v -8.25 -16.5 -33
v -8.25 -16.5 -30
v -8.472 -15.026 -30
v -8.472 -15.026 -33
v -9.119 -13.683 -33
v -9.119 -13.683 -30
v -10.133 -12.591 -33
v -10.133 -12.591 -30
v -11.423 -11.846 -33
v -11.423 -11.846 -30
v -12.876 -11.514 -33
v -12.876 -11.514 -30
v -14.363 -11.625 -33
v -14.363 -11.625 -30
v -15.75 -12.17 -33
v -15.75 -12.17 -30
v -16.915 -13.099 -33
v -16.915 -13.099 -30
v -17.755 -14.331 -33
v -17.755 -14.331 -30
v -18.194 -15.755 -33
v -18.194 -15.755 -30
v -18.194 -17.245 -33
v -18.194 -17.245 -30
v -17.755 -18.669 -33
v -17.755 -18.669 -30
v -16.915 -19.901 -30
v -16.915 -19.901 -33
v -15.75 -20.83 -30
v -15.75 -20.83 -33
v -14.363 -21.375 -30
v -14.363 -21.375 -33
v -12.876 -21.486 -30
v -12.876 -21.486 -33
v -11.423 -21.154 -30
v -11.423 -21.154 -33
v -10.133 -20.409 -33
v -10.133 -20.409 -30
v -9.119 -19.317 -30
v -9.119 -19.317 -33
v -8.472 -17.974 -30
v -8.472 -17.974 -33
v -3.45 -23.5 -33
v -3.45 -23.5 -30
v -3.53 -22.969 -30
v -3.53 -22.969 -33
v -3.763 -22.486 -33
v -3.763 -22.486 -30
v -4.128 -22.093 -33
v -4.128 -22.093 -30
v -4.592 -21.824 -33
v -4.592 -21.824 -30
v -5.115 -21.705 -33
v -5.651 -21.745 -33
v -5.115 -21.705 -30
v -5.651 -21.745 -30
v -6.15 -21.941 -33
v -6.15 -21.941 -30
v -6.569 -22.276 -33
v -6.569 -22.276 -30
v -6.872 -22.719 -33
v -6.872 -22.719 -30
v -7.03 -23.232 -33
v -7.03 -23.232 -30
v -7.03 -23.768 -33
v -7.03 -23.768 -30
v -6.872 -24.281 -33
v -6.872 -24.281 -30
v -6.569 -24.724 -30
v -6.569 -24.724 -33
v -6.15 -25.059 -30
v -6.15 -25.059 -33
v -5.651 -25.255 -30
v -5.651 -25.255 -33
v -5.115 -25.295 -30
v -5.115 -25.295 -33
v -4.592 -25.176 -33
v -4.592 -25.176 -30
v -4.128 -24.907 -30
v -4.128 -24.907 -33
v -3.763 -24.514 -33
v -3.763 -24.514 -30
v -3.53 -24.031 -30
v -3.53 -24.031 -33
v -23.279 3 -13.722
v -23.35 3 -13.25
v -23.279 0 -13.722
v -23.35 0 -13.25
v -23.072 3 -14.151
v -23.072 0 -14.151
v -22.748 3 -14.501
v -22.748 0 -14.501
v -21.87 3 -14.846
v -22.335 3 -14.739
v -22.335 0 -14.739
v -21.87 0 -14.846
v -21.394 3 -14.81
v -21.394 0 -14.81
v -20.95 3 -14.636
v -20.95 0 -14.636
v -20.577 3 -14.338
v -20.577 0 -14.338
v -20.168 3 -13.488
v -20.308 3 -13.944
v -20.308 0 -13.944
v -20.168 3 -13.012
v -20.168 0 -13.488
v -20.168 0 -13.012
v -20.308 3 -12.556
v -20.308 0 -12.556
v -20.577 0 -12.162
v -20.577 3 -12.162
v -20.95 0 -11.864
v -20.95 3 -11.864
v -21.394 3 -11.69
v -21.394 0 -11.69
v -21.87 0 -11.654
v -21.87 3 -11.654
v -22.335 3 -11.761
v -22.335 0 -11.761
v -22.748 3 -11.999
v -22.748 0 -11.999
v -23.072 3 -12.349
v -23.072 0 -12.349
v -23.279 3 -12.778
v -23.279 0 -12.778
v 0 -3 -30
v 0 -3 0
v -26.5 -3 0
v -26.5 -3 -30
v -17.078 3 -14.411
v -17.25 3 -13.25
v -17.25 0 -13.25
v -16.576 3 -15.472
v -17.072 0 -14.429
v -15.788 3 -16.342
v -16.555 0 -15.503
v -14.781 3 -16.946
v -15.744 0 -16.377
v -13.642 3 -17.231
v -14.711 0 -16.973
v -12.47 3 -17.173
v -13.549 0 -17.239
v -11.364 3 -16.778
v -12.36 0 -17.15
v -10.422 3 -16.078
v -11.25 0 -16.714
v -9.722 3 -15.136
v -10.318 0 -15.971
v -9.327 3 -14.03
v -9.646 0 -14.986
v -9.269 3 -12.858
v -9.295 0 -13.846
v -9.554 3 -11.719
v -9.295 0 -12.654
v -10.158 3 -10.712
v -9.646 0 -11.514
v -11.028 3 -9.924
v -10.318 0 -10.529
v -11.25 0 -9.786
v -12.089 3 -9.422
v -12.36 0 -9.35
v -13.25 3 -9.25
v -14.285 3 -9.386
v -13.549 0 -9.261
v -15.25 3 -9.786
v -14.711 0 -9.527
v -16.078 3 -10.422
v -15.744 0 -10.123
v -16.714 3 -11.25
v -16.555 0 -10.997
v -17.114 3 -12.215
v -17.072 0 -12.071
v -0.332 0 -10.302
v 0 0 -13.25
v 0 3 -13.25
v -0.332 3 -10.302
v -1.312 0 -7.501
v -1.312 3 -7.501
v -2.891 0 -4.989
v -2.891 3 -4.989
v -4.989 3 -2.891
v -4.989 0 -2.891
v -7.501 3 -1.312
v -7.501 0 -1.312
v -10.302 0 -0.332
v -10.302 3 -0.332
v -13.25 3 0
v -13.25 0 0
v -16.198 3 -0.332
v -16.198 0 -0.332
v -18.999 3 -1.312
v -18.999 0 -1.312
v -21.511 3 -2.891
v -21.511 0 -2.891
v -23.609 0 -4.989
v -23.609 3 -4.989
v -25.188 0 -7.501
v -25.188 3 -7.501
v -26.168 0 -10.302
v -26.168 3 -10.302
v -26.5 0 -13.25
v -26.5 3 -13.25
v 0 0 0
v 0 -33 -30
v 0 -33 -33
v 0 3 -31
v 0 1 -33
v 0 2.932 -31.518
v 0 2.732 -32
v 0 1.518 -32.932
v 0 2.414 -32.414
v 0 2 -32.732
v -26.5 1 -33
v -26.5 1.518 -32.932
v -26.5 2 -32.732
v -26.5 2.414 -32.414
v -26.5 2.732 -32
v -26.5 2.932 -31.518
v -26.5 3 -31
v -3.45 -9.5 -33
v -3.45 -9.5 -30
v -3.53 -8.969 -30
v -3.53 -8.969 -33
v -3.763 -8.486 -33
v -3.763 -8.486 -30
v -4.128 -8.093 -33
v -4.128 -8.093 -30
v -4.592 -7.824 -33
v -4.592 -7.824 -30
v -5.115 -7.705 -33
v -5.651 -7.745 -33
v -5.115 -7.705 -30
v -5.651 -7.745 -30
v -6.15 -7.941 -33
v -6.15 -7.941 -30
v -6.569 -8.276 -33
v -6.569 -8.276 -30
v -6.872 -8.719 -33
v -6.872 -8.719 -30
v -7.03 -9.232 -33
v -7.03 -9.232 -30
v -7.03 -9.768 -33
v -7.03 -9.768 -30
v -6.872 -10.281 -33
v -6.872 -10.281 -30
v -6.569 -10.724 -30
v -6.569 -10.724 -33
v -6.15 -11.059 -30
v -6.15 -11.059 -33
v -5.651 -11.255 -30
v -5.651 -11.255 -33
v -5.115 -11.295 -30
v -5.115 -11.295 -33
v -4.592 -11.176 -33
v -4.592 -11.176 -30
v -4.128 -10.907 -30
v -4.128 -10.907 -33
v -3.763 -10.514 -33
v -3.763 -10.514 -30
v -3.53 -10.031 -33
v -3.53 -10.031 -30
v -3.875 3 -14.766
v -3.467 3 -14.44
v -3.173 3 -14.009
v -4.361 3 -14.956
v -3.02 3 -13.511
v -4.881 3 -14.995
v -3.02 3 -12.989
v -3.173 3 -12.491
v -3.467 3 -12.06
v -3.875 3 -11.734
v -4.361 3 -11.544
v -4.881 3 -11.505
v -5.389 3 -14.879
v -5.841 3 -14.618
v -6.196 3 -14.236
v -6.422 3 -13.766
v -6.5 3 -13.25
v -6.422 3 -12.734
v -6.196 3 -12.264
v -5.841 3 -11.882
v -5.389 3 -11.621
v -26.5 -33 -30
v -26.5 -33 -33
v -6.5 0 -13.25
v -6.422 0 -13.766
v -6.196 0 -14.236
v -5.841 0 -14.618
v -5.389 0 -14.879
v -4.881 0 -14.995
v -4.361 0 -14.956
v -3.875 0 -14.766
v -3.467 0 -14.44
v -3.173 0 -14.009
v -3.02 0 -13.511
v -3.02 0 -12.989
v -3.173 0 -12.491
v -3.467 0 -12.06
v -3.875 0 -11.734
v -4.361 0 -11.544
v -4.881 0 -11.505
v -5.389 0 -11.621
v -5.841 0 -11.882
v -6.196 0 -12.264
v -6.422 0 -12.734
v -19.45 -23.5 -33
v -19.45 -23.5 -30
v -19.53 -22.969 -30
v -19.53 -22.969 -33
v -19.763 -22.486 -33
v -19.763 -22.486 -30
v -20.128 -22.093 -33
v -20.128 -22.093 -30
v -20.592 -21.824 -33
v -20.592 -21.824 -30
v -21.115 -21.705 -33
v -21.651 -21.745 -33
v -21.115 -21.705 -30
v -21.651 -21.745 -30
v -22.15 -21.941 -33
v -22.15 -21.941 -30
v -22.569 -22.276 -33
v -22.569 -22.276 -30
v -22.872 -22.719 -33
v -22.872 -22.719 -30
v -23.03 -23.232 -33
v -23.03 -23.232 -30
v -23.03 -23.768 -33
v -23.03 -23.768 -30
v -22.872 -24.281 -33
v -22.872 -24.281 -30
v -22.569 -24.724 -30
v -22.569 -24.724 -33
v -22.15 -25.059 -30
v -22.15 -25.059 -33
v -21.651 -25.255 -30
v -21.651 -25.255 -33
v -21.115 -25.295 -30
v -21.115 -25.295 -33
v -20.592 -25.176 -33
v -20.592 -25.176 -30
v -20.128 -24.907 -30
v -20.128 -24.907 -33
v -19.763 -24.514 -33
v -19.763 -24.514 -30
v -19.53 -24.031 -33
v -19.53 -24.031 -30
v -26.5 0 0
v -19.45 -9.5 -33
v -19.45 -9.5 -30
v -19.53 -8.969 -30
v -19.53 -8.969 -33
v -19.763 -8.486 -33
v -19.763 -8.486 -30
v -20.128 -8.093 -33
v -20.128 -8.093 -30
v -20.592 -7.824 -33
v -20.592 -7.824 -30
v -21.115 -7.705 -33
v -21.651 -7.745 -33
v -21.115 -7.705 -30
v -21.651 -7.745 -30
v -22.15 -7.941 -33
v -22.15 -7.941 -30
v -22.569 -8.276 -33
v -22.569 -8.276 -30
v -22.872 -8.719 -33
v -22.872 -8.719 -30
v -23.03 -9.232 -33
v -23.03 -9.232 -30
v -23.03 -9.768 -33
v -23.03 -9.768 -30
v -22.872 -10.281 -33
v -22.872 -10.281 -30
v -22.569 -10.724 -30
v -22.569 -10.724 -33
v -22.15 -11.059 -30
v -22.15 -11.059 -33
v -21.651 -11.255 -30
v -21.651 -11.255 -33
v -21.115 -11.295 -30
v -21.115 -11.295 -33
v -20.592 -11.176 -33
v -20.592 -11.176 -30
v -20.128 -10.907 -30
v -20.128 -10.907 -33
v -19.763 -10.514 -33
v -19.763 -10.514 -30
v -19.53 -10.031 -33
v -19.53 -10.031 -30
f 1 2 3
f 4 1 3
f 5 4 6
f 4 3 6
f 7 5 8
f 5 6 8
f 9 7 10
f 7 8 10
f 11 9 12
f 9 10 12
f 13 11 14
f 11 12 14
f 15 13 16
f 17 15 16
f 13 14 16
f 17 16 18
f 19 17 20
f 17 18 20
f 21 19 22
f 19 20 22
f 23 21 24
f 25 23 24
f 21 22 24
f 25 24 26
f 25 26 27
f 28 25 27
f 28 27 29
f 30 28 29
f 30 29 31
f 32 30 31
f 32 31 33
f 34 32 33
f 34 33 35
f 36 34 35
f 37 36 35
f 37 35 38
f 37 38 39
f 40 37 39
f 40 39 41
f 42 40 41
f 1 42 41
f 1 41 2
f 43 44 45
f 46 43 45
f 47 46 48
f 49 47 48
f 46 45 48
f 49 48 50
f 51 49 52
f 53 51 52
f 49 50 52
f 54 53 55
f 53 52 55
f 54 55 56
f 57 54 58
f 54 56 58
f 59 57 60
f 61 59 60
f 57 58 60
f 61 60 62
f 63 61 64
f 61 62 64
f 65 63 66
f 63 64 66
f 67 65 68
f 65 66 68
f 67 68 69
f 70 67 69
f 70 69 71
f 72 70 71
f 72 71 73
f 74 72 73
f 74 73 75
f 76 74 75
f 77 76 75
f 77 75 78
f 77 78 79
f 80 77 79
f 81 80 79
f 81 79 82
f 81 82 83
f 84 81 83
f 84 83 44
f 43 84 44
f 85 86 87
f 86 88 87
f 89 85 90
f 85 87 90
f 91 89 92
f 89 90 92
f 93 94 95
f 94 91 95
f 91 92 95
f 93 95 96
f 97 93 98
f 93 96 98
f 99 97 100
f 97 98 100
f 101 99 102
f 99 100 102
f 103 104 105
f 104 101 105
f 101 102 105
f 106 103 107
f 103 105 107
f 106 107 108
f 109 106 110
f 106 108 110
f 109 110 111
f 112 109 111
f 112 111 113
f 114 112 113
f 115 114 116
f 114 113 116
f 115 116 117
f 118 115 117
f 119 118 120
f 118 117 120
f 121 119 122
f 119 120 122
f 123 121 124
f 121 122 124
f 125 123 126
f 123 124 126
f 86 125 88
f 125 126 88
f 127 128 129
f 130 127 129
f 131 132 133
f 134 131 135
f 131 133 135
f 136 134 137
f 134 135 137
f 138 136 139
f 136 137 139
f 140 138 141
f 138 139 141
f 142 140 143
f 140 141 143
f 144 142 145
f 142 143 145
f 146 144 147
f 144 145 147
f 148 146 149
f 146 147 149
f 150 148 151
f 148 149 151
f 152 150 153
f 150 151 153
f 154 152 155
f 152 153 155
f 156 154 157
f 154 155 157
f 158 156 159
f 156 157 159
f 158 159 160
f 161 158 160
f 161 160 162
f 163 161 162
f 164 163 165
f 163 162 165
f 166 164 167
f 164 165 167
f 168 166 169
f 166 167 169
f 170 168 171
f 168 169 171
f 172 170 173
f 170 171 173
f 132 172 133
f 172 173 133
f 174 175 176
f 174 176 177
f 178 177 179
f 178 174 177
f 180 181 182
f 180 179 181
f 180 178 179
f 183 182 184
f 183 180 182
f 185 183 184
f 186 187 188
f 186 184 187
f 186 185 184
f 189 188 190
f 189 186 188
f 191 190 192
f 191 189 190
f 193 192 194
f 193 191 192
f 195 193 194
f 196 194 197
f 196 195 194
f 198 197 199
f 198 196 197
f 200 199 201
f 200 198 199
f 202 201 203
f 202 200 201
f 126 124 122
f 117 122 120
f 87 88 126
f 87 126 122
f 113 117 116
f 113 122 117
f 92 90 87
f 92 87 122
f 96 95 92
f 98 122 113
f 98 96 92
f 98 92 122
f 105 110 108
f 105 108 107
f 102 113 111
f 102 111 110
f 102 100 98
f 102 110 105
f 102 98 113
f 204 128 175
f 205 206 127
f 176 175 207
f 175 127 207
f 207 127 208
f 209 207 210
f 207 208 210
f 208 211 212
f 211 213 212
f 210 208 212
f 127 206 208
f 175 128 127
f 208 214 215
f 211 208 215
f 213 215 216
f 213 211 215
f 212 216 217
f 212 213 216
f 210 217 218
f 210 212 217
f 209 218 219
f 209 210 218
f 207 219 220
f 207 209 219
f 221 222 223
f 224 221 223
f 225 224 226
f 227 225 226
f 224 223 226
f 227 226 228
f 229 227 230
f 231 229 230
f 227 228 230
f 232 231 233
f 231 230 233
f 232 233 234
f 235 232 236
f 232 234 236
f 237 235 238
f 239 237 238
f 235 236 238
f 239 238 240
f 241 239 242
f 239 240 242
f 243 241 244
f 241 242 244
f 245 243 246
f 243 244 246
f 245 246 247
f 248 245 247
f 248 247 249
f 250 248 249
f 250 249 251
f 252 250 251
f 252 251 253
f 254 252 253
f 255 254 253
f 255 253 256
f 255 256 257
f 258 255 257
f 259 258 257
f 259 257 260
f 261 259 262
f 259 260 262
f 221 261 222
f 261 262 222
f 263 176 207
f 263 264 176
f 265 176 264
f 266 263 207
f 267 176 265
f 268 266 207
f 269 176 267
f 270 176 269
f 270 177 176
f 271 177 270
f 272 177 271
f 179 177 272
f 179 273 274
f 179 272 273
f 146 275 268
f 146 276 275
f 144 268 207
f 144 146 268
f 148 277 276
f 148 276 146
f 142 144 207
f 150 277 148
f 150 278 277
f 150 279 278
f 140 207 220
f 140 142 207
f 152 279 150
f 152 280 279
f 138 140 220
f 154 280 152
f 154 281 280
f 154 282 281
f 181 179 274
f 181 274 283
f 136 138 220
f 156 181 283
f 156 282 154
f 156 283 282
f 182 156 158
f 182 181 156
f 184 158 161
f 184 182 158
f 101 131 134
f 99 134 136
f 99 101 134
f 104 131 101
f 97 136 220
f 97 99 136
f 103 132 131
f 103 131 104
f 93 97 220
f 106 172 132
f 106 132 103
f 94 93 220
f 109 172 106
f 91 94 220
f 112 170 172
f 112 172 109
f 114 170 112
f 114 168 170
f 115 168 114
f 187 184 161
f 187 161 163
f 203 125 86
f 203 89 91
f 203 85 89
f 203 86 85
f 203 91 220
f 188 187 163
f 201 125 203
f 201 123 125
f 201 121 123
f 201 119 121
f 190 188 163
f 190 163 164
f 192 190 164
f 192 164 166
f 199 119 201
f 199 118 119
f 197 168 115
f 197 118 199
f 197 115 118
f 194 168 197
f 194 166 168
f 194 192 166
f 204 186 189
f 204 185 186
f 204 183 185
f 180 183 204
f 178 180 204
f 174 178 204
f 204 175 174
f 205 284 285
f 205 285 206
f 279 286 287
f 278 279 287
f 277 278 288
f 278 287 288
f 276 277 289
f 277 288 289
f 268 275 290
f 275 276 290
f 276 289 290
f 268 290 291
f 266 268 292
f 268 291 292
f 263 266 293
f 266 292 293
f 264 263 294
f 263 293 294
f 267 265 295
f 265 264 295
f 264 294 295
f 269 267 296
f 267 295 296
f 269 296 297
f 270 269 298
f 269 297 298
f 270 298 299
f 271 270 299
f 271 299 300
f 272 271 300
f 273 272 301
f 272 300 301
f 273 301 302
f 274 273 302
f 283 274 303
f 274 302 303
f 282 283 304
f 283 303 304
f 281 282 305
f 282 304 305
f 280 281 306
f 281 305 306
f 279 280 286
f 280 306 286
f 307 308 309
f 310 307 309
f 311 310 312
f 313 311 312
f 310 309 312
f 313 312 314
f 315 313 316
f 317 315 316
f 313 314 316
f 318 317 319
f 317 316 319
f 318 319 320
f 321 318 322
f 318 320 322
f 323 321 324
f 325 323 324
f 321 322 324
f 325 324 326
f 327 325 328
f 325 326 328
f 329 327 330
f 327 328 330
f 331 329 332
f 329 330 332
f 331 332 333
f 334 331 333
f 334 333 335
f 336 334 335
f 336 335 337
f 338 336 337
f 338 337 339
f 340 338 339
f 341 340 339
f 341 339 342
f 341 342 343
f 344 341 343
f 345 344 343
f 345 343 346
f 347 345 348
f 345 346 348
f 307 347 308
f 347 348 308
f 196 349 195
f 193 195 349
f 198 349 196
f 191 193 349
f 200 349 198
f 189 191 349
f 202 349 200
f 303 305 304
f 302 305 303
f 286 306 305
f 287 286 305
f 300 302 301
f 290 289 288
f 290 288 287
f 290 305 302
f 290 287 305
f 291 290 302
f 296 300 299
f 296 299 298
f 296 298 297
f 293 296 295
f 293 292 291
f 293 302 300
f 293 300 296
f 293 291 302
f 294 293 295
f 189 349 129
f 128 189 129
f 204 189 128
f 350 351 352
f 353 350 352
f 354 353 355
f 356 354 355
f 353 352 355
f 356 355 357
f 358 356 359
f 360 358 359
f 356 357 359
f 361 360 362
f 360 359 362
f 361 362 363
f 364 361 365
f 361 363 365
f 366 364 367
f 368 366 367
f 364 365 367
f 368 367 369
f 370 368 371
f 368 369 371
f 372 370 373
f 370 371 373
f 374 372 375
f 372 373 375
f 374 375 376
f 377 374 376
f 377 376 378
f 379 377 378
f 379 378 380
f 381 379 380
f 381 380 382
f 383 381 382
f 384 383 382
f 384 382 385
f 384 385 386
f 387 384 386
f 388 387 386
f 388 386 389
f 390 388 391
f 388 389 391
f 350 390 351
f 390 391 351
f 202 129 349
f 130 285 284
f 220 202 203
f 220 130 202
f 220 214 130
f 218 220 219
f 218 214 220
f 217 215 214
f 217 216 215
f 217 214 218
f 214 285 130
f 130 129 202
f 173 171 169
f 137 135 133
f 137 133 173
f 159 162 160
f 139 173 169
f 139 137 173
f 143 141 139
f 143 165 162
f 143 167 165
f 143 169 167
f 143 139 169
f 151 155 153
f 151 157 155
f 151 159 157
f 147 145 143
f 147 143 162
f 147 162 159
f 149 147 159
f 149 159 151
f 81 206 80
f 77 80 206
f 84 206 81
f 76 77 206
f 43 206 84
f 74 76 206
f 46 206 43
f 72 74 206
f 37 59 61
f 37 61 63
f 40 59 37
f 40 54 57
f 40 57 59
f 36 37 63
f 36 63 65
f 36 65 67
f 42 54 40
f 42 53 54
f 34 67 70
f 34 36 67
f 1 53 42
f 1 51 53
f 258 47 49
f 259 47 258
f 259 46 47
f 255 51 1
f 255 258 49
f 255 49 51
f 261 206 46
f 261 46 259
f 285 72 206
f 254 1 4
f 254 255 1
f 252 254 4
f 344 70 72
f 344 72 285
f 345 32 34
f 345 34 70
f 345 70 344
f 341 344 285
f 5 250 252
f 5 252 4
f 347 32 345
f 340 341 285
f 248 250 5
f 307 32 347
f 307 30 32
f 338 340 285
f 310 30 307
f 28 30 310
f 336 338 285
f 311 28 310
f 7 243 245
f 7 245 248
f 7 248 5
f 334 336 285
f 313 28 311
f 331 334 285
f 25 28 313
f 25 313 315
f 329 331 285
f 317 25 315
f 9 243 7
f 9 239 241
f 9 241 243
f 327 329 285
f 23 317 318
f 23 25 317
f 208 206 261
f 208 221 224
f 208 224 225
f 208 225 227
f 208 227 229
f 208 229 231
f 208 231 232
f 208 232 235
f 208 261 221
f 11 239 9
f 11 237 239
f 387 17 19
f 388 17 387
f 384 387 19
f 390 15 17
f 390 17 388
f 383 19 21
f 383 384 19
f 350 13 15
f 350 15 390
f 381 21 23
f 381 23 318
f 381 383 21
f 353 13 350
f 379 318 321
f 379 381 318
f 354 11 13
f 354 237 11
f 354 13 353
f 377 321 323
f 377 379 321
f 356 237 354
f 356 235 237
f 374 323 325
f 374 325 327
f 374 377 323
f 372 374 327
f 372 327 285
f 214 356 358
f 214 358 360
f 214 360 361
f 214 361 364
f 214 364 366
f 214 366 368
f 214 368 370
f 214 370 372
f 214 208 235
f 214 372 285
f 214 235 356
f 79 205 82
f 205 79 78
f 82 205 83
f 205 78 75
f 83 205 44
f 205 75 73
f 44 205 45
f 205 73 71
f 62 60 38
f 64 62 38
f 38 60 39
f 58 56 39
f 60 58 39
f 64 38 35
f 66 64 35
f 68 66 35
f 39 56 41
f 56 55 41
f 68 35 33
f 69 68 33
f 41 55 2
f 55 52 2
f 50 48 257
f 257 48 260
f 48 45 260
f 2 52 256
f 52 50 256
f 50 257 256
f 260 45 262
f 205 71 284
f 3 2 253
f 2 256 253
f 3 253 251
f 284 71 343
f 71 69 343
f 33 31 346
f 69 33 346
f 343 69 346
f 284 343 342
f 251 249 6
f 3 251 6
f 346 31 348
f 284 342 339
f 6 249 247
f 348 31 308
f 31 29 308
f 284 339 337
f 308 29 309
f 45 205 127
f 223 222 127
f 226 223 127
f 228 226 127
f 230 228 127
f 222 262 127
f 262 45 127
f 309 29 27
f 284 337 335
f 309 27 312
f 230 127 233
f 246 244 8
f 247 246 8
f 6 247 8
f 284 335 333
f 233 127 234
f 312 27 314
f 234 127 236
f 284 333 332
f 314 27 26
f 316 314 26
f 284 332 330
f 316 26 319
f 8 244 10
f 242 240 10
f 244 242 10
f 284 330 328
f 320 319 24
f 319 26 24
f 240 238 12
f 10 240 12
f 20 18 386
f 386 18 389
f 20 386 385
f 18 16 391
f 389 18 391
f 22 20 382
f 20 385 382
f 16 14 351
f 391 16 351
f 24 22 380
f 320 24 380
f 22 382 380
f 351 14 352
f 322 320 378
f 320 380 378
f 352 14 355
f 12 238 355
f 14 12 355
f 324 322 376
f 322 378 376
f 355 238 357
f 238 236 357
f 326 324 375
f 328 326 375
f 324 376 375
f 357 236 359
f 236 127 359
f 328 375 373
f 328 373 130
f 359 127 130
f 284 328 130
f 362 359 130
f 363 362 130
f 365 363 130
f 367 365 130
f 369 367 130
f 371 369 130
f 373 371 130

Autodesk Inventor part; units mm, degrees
ref_plane "YZ Plane" through (0, 0, 0) normal (1, 0, 0) x (0, 1, 0)
ref_plane "XZ Plane" through (0, 0, 0) normal (0, 1, 0) x (-1, 0, 0)
ref_plane "XY Plane" through (0, 0, 0) normal (0, 0, 1) x (1, 0, 0)
sketch "Sketch1" plane through (0, 0, 0) normal (0, 1, 0) x (-1, 0, 0)
  line L0 (0, 0) -> (26.5, 0)
  line L1 (26.5, 0) -> (26.5, -33)
  line L2 (26.5, -33) -> (0, -33)
  line L3 (0, -33) -> (0, 0)
  line L4 (26.5, -33) -> (26.5, -30)
  line L5 (26.5, -30) -> (0, -30)
  circle A0 centre (13.25, -13.25) radius 4
  arc A1 (22.5449, -12.2666) -> (20.6583, -12.6119) centre (21.75, -13.25) ccw
  circle A2 centre (21.75, -13.25) radius 1.6
  circle A3 centre (4.75, -13.25) radius 1.75
  circle A4 centre (4.75, -13.25) radius 1.6
  circle A5 centre (13.25, -13.25) radius 13.25
  line L6 (13.25, -13.25) -> (13.25, 0)
  line L7 (13.25, 0) -> (13.25, -13.25)
  point P0 (0, -13.25)
  point P1 (26.5, -13.25)
  dimension "d9" = 26.5
  dimension "d3" = 26.5
  dimension "d4" = 33
  dimension "d5" = 3
  dimension "d6" = 8
  dimension "d7" = 3.2
  dimension "d8" = 3.2
  dimension "d10" = 13.25
extrude "Extrusion1" add sketch "Sketch1" along normal blind 3 contours A5 | A5 L1 L5 L3 | L5 L1 L2 L3
sketch "Sketch2" plane through (0, 0, 0) normal (0, -1, 0) x (1, 0, 0)
  line L0 (0, -33) -> (-26.5, -33) projected
  line L1 (0, -13.25) -> (0, -33) projected
  line L2 (-26.5, -33) -> (0, -33)
  line L3 (0, -33) -> (0, -30)
  line L4 (0, -30) -> (-26.5, -30)
  line L5 (-26.5, -30) -> (-26.5, -33)
  point P0 (0, 0)
  dimension "d13" = 3
extrude "Extrusion2" add sketch "Sketch2" along normal blind 33
fillet "Fillet1" radius 2 1 edges at (-13.25, 3, -33)
sketch "Sketch3" plane through (-26.5, 0, -30) normal (0, 0, 1) x (1, 0, 0)
  line L0 (26.5, -33) -> (0, -33) projected
  line L1 (13.25, -33) -> (13.25, 0)
  line L2 (0, 0) -> (0, -33) projected
  line L3 (0, -16.5) -> (26.5, -16.5)
  line L4 (26.5, 0) -> (26.5, -33) projected
  circle A0 centre (13.25, -16.5) radius 5
  line L5 (0, -16.5) -> (0, -23.5)
  line L6 (13.25, -33) -> (5.25, -33)
  circle A1 centre (5.25, -23.5) radius 1.8
  circle A2 centre (5.25, -9.5) radius 1.8
  circle A3 centre (21.25, -23.5) radius 1.8
  circle A4 centre (21.25, -9.5) radius 1.8
  dimension "d17" = 10
  dimension "d18" = 7
  dimension "d19" = 8
  dimension "d20" = 3.6
  dimension "d23" = 14
  dimension "d26" = 16
extrude "Extrusion3" cut sketch "Sketch3" against normal blind 33 contours A0 L3 L1 | L1 L3 A0 | L3 L1 A0 | L3 A0 L1 | A1 | A2 | A3 | A4
sketch "Sketch4" plane through (-26.5, 0, -30) normal (0, 0, 1) x (1, 0, 0)
  line L0 (0, -33) -> (0, 1) projected
  line L1 (26.5, 0) -> (0, 0)
  line L2 (0, 0) -> (0, -33)
  line L3 (0, -33) -> (26.5, -33)
  line L4 (26.5, -33) -> (26.5, 0)
  circle A0 centre (13.25, -16.5) radius 5
  circle A1 centre (21.25, -23.5) radius 1.8 projected
  circle A2 centre (21.25, -23.5) radius 1.8
  circle A3 centre (21.25, -9.5) radius 1.8 projected
  circle A4 centre (21.25, -9.5) radius 1.8
  circle A5 centre (5.25, -9.5) radius 1.8 projected
  circle A6 centre (5.25, -9.5) radius 1.8
  circle A7 centre (5.25, -23.5) radius 1.8 projected
  circle A8 centre (5.25, -23.5) radius 1.8
  line L5 (26.5, 0) -> (0, 0)
  line L6 (0, 0) -> (0, -33)
  line L7 (0, -33) -> (26.5, -33)
  line L8 (26.5, -33) -> (26.5, 0)
sketch "Sketch5" plane through (-26.5, 0, -30) normal (0, 0, 1) x (1, 0, 0)
  line L0 (0, -33) -> (0, 1) projected
  line L1 (26.5, -33) -> (26.5, 1) projected
  line L2 (0, 0) -> (26.5, 0)
  line L3 (26.5, 0) -> (26.5, -3)
  line L4 (26.5, -3) -> (0, -3)
  line L5 (0, -3) -> (0, 0)
  dimension "d31" = 3
extrude "Extrusion4" add sketch "Sketch5" along normal blind 30
sketch "Sketch6" plane through (-13.25, 0, -13.25) normal (0, 1, 0) x (1, 0, 0)
  circle A0 centre (0, 0) radius 4
  circle A1 centre (-8.5, 0) radius 1.6 projected
  circle A2 centre (-8.5, 0) radius 1.6
  circle A3 centre (8.5, 0) radius 1.75 projected
  circle A4 centre (8.5, 0) radius 1.75
  point P0 (13.25, -13.25)
properties part number "bracket jga"
